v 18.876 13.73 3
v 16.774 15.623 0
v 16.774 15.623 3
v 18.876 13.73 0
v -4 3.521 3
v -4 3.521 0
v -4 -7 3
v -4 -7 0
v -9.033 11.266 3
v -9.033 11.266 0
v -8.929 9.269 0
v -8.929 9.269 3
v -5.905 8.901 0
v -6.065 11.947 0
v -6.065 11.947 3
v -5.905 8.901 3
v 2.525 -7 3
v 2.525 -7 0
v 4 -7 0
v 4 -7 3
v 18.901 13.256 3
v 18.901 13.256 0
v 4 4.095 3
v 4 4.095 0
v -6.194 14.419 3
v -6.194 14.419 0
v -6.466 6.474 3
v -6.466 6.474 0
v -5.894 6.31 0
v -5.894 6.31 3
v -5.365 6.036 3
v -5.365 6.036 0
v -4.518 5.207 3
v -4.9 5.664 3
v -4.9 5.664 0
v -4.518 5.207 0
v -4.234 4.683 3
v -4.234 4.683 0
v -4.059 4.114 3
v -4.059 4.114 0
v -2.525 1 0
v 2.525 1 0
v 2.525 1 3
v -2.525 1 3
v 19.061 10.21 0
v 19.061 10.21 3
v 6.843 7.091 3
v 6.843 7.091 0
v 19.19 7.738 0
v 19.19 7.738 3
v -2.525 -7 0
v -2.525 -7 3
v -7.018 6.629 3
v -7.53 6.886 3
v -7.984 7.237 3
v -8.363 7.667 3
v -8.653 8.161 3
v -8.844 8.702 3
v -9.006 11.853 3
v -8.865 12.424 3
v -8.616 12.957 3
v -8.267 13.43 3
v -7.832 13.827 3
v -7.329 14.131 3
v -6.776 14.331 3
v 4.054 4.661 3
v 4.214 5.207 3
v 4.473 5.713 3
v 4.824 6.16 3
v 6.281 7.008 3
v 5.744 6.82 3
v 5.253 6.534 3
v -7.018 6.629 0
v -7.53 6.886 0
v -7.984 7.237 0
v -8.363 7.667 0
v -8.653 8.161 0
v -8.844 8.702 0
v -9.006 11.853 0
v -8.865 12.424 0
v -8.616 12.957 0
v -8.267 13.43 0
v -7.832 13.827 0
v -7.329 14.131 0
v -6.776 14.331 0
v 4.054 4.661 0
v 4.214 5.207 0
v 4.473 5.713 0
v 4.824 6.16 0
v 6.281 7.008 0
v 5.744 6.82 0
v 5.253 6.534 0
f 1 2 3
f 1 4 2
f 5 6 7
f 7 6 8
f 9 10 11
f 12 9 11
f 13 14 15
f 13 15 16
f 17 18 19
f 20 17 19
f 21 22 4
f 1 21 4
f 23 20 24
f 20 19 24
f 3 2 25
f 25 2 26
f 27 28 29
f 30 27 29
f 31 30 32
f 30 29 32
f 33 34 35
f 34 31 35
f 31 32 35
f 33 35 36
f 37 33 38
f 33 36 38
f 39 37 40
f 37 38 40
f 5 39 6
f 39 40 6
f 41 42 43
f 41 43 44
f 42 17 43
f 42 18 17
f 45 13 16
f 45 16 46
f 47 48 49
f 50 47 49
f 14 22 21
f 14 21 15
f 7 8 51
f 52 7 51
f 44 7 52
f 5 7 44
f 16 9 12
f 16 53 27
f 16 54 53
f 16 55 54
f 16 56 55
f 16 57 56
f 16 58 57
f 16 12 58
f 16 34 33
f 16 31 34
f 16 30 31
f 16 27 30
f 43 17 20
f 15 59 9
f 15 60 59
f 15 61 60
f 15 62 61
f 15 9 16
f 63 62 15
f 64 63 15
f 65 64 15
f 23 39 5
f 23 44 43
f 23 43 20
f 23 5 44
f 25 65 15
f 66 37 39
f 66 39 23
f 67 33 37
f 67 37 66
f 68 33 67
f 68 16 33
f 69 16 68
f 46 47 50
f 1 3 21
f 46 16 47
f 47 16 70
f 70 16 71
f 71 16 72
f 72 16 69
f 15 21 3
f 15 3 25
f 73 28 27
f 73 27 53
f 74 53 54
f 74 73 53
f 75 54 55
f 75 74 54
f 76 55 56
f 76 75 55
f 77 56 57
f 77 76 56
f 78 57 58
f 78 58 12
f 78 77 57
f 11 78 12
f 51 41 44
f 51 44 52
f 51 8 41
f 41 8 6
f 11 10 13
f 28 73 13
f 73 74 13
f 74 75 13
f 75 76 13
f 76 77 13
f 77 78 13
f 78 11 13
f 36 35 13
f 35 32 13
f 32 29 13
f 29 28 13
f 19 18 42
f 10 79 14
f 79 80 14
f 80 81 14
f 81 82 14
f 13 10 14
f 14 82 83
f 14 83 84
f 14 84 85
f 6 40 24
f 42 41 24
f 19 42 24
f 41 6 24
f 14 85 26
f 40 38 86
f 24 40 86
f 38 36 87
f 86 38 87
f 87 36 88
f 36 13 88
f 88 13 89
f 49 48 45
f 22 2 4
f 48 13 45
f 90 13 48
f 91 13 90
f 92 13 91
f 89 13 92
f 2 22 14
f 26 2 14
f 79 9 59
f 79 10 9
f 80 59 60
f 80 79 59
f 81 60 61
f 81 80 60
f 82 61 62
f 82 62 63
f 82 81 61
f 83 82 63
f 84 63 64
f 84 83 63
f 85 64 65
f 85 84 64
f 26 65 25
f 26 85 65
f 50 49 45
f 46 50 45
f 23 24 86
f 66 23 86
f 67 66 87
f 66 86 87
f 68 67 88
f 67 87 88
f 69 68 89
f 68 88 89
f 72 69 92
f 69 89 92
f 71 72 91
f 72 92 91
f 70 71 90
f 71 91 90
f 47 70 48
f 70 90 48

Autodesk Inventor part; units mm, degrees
ref_plane "YZ Plane" through (0, 0, 0) normal (1, 0, 0) x (0, 1, 0)
ref_plane "XZ Plane" through (0, 0, 0) normal (0, 1, 0) x (-1, 0, 0)
ref_plane "XY Plane" through (0, 0, 0) normal (0, 0, 1) x (1, 0, 0)
sketch "Sketch1" plane through (0, 0, 0) normal (0, 0, 1) x (1, 0, 0)
  line L0 (-4, -7) -> (4, -7)
  line L1 (4, -7) -> (4, 7)
  line L2 (4, 7) -> (-4, 7)
  line L3 (-4, 7) -> (-4, -7)
  line L4 (-4, -7) -> (4, 7) construction
  line L5 (4, -7) -> (-4, 7) construction
  line L6 (19.1902, 7.7382) -> (18.7715, 15.7272)
  line L7 (18.7715, 15.7272) -> (-9.1902, 14.2618)
  line L8 (-9.1902, 14.2618) -> (-8.7715, 6.2728)
  line L9 (-8.7715, 6.2728) -> (19.1902, 7.7382)
  line L10 (19.1902, 7.7382) -> (-9.1902, 14.2618) construction
  line L11 (18.7715, 15.7272) -> (-8.7715, 6.2728) construction
  line L12 (19.0606, 10.2098) -> (18.901, 13.2556)
  line L13 (18.901, 13.2556) -> (-6.0647, 11.9472)
  line L14 (-6.0647, 11.9472) -> (-5.9051, 8.9014)
  line L15 (-5.9051, 8.9014) -> (19.0606, 10.2098)
  line L16 (-8.9808, 10.2673) -> (18.9808, 11.7327)
  line L17 (-2.525, -7) -> (2.525, -7)
  line L18 (2.525, -7) -> (2.525, 1)
  line L19 (2.525, 1) -> (-2.525, 1)
  line L20 (-2.525, 1) -> (-2.525, -7)
  point P0 (0, 0)
  point P1 (0, 0)
  point P2 (5, 11)
  point P3 (5, 11)
  point P4 (5, 11)
  point P5 (0, 1)
  point P6 (0, -7)
  point P7 (-4, 6.5228)
  point P8 (4, 6.9421)
  point P9 (19.0606, 10.2098)
  point P10 (18.901, 13.2556)
  dimension "d19" = 8
  dimension "d20" = 14
  dimension "d21" = 5
  dimension "d22" = 3
  dimension "d23" = 4
  dimension "d24" = 8
  dimension "d25" = 28
  dimension "d27" = 3.05
  dimension "d29" = 25
  dimension "d30" = 5.05
  dimension "d31" = 8
extrude "Plate1" add sketch "Sketch1" along normal blind 3 contours L3 L9 L1 L0 L18 L19 L20 | L9 L8 L16 L14 L15 L6 L1 L2 L3 | L3 L2 L1 L9 | L8 L7 L6 L13 L14 L16
chamfer "Corner Chamfer1" distance 2 angle 45 1 edges at (18.7715, 15.7272, 1.5)
fillet "Corner Round2" radius 3 4 edges at (4, 6.9421, 1.5) (-8.7715, 6.2728, 1.5) (-4, 6.5228, 1.5) (-9.1902, 14.2618, 1.5)
equation "\"d14\" = Thickness"
equation "\"BendRadius\" = Thickness"
equation "\"BendReliefWidth\" = Thickness"
equation "\"BendReliefDepth\" = 0.5 * Thickness"
equation "\"CornerReliefSize\" = 4 * Thickness"
equation "\"MinimumRemnant\" = 2 * Thickness"
equation "\"TransitionRadius\" = BendRadius"
equation "\"JacobiRadiusSize\" = BendRadius"
equation "\"GapSize\" = Thickness"
equation "\"Thickness\" = 3"
properties part number "Path Plate Connector"
